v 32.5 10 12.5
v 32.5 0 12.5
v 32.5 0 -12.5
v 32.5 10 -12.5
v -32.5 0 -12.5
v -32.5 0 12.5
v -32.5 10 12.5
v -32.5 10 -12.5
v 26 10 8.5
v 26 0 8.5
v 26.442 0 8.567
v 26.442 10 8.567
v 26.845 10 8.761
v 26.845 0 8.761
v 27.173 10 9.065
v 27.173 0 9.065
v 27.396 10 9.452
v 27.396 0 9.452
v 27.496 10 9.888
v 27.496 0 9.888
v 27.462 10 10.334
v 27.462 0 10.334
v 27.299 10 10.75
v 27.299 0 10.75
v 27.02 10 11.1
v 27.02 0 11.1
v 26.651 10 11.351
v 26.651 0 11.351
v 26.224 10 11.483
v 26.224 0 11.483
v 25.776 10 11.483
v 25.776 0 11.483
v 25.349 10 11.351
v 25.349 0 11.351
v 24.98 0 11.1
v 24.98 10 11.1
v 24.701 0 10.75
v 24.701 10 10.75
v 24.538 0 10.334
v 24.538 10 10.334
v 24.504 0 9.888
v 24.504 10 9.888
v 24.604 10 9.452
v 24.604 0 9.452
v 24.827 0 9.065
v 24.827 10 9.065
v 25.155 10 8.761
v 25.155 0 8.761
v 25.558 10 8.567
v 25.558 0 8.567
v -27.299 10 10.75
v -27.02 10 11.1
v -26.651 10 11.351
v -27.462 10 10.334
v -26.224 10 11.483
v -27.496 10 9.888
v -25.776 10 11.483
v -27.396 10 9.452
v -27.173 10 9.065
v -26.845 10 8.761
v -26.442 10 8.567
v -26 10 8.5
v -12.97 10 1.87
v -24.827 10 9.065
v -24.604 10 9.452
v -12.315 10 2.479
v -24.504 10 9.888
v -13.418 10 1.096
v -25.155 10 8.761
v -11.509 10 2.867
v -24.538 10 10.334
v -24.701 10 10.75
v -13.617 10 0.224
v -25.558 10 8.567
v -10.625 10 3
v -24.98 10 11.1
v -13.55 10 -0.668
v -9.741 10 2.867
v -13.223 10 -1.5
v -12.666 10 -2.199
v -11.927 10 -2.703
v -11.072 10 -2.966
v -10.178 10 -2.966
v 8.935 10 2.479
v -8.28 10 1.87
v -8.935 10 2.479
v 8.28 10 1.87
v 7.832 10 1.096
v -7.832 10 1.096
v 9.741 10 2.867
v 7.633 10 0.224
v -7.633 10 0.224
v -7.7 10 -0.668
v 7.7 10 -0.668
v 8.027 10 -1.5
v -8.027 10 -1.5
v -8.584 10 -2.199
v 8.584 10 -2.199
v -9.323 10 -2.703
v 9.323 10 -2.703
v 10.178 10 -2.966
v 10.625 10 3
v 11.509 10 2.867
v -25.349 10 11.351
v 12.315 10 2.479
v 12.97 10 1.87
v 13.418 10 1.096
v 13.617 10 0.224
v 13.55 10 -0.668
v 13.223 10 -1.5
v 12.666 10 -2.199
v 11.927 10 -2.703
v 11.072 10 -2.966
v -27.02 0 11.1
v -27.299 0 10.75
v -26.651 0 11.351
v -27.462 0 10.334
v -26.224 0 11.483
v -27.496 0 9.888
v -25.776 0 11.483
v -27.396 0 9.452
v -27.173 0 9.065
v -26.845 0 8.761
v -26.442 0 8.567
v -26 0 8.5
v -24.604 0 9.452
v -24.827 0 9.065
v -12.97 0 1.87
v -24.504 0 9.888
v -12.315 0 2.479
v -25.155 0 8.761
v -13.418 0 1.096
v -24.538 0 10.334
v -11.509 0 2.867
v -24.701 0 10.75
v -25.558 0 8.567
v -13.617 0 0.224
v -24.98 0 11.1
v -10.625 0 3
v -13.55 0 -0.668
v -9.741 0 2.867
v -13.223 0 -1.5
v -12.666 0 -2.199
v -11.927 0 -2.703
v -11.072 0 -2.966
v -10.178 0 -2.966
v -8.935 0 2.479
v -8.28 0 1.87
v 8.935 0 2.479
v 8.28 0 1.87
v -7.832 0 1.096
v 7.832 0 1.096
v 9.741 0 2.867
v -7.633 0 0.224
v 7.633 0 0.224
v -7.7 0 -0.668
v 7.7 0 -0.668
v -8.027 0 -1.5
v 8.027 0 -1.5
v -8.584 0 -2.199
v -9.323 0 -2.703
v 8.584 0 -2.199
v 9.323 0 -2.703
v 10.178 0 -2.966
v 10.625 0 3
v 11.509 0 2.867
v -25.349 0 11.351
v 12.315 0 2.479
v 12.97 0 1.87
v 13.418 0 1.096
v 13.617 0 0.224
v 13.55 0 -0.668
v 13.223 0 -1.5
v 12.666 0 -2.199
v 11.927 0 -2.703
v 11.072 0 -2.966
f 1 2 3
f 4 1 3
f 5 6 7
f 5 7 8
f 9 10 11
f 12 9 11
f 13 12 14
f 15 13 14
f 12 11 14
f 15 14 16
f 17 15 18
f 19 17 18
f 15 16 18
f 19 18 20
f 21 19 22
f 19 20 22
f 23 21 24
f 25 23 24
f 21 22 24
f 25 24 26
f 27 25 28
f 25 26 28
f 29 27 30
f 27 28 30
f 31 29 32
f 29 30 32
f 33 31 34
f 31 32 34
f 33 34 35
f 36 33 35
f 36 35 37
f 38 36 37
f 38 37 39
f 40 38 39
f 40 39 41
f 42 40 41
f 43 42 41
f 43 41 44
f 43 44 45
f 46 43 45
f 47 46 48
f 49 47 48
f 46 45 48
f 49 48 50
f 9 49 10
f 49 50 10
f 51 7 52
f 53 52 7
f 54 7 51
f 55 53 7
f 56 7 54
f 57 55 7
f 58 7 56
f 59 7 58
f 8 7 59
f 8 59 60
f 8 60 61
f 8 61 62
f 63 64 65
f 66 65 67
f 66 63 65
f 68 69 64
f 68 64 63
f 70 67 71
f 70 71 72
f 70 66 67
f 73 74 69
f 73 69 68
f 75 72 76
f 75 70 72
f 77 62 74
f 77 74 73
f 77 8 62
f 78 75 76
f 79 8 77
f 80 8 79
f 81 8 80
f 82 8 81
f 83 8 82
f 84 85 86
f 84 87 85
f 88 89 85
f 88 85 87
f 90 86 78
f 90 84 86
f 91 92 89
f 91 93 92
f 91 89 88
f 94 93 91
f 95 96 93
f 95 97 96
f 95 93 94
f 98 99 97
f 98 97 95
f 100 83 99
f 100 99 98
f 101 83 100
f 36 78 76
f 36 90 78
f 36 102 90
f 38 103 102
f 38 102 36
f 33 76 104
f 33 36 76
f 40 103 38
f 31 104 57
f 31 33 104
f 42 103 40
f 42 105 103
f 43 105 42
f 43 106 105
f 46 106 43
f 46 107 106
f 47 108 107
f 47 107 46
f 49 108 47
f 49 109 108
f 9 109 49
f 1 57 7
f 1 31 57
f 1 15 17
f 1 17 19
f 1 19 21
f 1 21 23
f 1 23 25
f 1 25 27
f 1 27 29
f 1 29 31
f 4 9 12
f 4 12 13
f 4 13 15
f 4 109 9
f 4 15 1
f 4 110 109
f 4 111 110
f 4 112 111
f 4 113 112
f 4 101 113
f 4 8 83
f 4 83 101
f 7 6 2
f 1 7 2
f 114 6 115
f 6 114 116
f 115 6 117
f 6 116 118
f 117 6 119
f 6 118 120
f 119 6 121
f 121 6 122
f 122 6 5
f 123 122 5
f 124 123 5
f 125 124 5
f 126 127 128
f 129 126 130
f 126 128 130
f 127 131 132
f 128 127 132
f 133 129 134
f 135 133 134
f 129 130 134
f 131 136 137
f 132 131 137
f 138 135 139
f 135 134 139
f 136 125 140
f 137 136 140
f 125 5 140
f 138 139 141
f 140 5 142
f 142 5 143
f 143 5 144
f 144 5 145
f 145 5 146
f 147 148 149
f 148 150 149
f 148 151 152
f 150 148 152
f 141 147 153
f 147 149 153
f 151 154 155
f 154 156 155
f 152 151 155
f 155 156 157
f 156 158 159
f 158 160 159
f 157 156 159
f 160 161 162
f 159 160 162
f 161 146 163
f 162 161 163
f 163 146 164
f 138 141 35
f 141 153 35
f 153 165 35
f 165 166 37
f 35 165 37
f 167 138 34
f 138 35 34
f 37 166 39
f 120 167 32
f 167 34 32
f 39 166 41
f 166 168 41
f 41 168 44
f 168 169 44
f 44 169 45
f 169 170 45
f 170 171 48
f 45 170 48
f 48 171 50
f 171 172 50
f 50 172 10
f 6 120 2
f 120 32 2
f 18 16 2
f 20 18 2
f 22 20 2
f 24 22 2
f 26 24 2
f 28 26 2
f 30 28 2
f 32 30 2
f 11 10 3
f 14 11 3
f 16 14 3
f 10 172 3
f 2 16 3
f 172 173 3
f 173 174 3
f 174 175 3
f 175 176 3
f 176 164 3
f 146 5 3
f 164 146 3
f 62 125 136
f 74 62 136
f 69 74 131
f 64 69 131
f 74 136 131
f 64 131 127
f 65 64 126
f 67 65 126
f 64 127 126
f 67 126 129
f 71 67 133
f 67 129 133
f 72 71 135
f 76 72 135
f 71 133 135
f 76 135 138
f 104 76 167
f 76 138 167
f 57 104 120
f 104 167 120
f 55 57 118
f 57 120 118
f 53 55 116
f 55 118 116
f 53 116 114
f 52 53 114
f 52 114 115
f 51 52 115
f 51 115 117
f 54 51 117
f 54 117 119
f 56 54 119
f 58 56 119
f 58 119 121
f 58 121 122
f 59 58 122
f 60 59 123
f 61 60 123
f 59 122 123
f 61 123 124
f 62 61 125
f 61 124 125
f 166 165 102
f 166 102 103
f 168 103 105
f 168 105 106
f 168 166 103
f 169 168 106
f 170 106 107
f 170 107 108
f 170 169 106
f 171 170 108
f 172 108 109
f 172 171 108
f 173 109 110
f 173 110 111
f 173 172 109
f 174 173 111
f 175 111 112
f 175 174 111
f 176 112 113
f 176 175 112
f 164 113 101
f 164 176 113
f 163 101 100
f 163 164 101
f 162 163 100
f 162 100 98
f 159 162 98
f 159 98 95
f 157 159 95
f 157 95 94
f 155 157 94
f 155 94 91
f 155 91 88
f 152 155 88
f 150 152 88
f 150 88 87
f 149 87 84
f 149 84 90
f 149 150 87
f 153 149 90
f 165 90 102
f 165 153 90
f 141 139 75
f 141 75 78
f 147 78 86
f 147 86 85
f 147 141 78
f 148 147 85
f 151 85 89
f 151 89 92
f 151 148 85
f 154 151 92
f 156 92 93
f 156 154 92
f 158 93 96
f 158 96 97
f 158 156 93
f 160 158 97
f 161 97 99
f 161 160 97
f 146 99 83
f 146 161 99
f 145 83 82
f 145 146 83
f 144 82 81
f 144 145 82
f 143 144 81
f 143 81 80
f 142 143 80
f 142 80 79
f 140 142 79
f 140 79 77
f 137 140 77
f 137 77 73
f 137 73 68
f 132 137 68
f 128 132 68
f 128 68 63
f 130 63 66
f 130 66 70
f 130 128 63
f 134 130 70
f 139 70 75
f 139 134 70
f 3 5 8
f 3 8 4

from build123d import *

# Parameters (mm, degrees)
SKETCH_1_W          = 65
SKETCH_1_H          = 25
SKETCH_1_R          = 3
EXTRUDE_1_DEPTH     = 10
SKETCH_2_R          = 1.5
CUT_EXTRUDE_1_DEPTH = 10


with BuildPart() as part:
    # 草图1 → 凸台-拉伸1 (new body)
    with BuildSketch(Plane(origin=(0, 0, 0), x_dir=(1, 0, 0), z_dir=(0, 1, 0))):
        Rectangle(SKETCH_1_W, SKETCH_1_H)
        with Locations(Location((-10.625, 0, 0), (0, 0, 270))):
            Circle(SKETCH_1_R, mode=Mode.SUBTRACT)
        with Locations(Location((10.625, 0, 0), (0, 0, 270))):
            Circle(SKETCH_1_R, mode=Mode.SUBTRACT)
    extrude(amount=EXTRUDE_1_DEPTH)

    # 草图2 → 切除-拉伸1 (cut)
    with BuildSketch(Plane.XZ):
        with Locations(Location((-26, 10, 0), (0, 0, 270))):
            Circle(SKETCH_2_R)
        with Locations(Location((26, 10, 0), (0, 0, 270))):
            Circle(SKETCH_2_R)
    extrude(amount=-CUT_EXTRUDE_1_DEPTH, mode=Mode.SUBTRACT)


solid = part.part
